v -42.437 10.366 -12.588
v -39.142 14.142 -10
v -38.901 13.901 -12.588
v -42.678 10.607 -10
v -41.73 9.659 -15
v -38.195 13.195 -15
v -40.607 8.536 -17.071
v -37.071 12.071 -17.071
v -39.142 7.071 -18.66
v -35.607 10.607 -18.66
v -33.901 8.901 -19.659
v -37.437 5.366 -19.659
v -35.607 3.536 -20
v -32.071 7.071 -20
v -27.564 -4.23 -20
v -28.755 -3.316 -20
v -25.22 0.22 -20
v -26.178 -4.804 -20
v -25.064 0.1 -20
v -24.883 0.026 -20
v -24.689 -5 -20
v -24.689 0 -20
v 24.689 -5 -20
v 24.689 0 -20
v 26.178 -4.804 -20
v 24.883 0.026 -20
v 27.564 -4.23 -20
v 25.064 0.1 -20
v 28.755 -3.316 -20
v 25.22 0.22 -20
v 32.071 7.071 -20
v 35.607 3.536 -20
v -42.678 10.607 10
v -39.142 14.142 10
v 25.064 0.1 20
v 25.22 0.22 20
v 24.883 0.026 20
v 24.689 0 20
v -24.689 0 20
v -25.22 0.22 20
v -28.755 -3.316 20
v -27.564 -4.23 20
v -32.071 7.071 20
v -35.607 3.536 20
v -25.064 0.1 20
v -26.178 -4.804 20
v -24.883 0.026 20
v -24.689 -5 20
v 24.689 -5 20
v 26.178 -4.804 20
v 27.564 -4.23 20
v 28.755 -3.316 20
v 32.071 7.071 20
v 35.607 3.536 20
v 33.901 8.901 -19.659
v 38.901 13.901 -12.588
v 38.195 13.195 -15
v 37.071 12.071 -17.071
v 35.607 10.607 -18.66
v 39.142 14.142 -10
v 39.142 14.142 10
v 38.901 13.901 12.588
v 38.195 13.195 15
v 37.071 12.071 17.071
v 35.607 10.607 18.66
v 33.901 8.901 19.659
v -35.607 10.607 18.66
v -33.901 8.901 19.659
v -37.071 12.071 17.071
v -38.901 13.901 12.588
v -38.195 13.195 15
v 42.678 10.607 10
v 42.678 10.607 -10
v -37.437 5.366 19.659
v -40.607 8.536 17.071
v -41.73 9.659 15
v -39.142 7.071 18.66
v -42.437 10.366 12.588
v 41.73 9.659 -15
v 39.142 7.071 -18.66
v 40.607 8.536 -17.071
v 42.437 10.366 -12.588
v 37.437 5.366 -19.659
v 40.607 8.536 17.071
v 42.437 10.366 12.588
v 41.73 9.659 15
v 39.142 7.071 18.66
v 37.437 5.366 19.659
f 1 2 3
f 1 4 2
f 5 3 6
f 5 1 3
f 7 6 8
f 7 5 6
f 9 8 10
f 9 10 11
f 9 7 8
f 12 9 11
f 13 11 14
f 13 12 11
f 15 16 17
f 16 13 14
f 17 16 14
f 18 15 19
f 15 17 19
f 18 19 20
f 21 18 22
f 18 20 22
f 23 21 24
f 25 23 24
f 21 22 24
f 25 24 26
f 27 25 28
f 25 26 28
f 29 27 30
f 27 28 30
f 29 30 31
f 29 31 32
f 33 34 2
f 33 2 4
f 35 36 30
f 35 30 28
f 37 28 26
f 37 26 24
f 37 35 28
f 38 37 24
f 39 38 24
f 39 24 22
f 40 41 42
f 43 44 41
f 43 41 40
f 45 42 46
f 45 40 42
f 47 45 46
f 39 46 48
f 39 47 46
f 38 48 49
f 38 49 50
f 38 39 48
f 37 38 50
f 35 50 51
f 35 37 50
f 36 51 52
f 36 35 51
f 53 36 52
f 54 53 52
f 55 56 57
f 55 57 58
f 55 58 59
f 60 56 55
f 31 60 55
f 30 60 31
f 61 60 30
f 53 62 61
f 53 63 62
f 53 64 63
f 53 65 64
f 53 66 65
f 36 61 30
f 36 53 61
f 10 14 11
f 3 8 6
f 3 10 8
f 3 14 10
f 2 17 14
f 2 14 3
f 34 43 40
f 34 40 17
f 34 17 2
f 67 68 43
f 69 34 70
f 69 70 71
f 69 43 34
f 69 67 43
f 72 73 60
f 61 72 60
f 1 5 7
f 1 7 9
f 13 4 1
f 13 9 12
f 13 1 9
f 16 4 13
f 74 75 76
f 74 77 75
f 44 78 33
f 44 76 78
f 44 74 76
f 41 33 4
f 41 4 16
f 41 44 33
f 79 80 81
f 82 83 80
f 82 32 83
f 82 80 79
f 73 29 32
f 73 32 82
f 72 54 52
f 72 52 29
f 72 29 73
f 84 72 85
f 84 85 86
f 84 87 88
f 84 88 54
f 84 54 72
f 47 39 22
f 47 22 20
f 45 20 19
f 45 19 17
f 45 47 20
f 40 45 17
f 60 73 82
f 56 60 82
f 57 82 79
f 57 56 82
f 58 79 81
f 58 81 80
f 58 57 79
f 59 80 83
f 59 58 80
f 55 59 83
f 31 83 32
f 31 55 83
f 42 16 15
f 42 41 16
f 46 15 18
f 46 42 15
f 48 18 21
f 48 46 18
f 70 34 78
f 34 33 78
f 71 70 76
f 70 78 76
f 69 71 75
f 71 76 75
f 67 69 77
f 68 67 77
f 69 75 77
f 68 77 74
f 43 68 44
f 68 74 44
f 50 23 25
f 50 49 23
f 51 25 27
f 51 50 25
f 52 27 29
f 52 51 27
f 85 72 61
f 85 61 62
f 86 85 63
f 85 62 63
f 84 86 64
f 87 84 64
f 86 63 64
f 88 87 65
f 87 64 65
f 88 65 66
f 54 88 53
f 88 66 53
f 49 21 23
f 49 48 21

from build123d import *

# Parameters (mm, degrees)
SM_BASE_FLANGE_1_DEPTH = 20
FILLET_1_R             = 10


# Sheet-metal steps are written as plain solids
with BuildPart() as part:
    # Sketch 1 → Базовая кромка1 (new body)
    with BuildSketch(Plane.XY):
        with BuildLine():
            Line((39.142135624, 14.142135624), (25.219669914, 0.219669914))
            ThreePointArc((25.219669914, 0.219669914), (24.976352402, 0.057090351), (24.689339828, 0))
            Line((24.689339828, 0), (-24.689339828, 0))
            ThreePointArc((-24.689339828, 0), (-24.976352402, 0.057090351), (-25.219669914, 0.219669914))
            Line((-25.219669914, 0.219669914), (-39.142135624, 14.142135624))
            Line((-39.142135624, 14.142135624), (-42.67766953, 10.606601718))
            Line((-42.67766953, 10.606601718), (-28.75520382, -3.315863992))
            ThreePointArc((-28.75520382, -3.315863992), (-26.889769564, -4.562307312), (-24.689339828, -5))
            Line((-24.689339828, -5), (24.689339828, -5))
            ThreePointArc((24.689339828, -5), (26.889769564, -4.562307312), (28.75520382, -3.315863992))
            Line((28.75520382, -3.315863992), (42.67766953, 10.606601718))
            Line((42.67766953, 10.606601718), (39.142135624, 14.142135624))
        make_face()
    extrude(amount=SM_BASE_FLANGE_1_DEPTH)

    # Скругление1
    fillet_1_edges = [part.edges().sort_by_distance(p)[0] for p in [
        (40.909902577, 12.374368671, 20),
        (-40.909902577, 12.374368671, 20),
    ]]
    fillet(fillet_1_edges, radius=FILLET_1_R)

    # Зеркальное отражение1: part across plane


with BuildPart() as part_1:
    add(part.part)
    add(part.part.mirror(Plane(origin=(28.75520382, -3.315863992, 0), x_dir=(1, 0, 0), z_dir=(0, 0, -1))))


solid = part_1.part
